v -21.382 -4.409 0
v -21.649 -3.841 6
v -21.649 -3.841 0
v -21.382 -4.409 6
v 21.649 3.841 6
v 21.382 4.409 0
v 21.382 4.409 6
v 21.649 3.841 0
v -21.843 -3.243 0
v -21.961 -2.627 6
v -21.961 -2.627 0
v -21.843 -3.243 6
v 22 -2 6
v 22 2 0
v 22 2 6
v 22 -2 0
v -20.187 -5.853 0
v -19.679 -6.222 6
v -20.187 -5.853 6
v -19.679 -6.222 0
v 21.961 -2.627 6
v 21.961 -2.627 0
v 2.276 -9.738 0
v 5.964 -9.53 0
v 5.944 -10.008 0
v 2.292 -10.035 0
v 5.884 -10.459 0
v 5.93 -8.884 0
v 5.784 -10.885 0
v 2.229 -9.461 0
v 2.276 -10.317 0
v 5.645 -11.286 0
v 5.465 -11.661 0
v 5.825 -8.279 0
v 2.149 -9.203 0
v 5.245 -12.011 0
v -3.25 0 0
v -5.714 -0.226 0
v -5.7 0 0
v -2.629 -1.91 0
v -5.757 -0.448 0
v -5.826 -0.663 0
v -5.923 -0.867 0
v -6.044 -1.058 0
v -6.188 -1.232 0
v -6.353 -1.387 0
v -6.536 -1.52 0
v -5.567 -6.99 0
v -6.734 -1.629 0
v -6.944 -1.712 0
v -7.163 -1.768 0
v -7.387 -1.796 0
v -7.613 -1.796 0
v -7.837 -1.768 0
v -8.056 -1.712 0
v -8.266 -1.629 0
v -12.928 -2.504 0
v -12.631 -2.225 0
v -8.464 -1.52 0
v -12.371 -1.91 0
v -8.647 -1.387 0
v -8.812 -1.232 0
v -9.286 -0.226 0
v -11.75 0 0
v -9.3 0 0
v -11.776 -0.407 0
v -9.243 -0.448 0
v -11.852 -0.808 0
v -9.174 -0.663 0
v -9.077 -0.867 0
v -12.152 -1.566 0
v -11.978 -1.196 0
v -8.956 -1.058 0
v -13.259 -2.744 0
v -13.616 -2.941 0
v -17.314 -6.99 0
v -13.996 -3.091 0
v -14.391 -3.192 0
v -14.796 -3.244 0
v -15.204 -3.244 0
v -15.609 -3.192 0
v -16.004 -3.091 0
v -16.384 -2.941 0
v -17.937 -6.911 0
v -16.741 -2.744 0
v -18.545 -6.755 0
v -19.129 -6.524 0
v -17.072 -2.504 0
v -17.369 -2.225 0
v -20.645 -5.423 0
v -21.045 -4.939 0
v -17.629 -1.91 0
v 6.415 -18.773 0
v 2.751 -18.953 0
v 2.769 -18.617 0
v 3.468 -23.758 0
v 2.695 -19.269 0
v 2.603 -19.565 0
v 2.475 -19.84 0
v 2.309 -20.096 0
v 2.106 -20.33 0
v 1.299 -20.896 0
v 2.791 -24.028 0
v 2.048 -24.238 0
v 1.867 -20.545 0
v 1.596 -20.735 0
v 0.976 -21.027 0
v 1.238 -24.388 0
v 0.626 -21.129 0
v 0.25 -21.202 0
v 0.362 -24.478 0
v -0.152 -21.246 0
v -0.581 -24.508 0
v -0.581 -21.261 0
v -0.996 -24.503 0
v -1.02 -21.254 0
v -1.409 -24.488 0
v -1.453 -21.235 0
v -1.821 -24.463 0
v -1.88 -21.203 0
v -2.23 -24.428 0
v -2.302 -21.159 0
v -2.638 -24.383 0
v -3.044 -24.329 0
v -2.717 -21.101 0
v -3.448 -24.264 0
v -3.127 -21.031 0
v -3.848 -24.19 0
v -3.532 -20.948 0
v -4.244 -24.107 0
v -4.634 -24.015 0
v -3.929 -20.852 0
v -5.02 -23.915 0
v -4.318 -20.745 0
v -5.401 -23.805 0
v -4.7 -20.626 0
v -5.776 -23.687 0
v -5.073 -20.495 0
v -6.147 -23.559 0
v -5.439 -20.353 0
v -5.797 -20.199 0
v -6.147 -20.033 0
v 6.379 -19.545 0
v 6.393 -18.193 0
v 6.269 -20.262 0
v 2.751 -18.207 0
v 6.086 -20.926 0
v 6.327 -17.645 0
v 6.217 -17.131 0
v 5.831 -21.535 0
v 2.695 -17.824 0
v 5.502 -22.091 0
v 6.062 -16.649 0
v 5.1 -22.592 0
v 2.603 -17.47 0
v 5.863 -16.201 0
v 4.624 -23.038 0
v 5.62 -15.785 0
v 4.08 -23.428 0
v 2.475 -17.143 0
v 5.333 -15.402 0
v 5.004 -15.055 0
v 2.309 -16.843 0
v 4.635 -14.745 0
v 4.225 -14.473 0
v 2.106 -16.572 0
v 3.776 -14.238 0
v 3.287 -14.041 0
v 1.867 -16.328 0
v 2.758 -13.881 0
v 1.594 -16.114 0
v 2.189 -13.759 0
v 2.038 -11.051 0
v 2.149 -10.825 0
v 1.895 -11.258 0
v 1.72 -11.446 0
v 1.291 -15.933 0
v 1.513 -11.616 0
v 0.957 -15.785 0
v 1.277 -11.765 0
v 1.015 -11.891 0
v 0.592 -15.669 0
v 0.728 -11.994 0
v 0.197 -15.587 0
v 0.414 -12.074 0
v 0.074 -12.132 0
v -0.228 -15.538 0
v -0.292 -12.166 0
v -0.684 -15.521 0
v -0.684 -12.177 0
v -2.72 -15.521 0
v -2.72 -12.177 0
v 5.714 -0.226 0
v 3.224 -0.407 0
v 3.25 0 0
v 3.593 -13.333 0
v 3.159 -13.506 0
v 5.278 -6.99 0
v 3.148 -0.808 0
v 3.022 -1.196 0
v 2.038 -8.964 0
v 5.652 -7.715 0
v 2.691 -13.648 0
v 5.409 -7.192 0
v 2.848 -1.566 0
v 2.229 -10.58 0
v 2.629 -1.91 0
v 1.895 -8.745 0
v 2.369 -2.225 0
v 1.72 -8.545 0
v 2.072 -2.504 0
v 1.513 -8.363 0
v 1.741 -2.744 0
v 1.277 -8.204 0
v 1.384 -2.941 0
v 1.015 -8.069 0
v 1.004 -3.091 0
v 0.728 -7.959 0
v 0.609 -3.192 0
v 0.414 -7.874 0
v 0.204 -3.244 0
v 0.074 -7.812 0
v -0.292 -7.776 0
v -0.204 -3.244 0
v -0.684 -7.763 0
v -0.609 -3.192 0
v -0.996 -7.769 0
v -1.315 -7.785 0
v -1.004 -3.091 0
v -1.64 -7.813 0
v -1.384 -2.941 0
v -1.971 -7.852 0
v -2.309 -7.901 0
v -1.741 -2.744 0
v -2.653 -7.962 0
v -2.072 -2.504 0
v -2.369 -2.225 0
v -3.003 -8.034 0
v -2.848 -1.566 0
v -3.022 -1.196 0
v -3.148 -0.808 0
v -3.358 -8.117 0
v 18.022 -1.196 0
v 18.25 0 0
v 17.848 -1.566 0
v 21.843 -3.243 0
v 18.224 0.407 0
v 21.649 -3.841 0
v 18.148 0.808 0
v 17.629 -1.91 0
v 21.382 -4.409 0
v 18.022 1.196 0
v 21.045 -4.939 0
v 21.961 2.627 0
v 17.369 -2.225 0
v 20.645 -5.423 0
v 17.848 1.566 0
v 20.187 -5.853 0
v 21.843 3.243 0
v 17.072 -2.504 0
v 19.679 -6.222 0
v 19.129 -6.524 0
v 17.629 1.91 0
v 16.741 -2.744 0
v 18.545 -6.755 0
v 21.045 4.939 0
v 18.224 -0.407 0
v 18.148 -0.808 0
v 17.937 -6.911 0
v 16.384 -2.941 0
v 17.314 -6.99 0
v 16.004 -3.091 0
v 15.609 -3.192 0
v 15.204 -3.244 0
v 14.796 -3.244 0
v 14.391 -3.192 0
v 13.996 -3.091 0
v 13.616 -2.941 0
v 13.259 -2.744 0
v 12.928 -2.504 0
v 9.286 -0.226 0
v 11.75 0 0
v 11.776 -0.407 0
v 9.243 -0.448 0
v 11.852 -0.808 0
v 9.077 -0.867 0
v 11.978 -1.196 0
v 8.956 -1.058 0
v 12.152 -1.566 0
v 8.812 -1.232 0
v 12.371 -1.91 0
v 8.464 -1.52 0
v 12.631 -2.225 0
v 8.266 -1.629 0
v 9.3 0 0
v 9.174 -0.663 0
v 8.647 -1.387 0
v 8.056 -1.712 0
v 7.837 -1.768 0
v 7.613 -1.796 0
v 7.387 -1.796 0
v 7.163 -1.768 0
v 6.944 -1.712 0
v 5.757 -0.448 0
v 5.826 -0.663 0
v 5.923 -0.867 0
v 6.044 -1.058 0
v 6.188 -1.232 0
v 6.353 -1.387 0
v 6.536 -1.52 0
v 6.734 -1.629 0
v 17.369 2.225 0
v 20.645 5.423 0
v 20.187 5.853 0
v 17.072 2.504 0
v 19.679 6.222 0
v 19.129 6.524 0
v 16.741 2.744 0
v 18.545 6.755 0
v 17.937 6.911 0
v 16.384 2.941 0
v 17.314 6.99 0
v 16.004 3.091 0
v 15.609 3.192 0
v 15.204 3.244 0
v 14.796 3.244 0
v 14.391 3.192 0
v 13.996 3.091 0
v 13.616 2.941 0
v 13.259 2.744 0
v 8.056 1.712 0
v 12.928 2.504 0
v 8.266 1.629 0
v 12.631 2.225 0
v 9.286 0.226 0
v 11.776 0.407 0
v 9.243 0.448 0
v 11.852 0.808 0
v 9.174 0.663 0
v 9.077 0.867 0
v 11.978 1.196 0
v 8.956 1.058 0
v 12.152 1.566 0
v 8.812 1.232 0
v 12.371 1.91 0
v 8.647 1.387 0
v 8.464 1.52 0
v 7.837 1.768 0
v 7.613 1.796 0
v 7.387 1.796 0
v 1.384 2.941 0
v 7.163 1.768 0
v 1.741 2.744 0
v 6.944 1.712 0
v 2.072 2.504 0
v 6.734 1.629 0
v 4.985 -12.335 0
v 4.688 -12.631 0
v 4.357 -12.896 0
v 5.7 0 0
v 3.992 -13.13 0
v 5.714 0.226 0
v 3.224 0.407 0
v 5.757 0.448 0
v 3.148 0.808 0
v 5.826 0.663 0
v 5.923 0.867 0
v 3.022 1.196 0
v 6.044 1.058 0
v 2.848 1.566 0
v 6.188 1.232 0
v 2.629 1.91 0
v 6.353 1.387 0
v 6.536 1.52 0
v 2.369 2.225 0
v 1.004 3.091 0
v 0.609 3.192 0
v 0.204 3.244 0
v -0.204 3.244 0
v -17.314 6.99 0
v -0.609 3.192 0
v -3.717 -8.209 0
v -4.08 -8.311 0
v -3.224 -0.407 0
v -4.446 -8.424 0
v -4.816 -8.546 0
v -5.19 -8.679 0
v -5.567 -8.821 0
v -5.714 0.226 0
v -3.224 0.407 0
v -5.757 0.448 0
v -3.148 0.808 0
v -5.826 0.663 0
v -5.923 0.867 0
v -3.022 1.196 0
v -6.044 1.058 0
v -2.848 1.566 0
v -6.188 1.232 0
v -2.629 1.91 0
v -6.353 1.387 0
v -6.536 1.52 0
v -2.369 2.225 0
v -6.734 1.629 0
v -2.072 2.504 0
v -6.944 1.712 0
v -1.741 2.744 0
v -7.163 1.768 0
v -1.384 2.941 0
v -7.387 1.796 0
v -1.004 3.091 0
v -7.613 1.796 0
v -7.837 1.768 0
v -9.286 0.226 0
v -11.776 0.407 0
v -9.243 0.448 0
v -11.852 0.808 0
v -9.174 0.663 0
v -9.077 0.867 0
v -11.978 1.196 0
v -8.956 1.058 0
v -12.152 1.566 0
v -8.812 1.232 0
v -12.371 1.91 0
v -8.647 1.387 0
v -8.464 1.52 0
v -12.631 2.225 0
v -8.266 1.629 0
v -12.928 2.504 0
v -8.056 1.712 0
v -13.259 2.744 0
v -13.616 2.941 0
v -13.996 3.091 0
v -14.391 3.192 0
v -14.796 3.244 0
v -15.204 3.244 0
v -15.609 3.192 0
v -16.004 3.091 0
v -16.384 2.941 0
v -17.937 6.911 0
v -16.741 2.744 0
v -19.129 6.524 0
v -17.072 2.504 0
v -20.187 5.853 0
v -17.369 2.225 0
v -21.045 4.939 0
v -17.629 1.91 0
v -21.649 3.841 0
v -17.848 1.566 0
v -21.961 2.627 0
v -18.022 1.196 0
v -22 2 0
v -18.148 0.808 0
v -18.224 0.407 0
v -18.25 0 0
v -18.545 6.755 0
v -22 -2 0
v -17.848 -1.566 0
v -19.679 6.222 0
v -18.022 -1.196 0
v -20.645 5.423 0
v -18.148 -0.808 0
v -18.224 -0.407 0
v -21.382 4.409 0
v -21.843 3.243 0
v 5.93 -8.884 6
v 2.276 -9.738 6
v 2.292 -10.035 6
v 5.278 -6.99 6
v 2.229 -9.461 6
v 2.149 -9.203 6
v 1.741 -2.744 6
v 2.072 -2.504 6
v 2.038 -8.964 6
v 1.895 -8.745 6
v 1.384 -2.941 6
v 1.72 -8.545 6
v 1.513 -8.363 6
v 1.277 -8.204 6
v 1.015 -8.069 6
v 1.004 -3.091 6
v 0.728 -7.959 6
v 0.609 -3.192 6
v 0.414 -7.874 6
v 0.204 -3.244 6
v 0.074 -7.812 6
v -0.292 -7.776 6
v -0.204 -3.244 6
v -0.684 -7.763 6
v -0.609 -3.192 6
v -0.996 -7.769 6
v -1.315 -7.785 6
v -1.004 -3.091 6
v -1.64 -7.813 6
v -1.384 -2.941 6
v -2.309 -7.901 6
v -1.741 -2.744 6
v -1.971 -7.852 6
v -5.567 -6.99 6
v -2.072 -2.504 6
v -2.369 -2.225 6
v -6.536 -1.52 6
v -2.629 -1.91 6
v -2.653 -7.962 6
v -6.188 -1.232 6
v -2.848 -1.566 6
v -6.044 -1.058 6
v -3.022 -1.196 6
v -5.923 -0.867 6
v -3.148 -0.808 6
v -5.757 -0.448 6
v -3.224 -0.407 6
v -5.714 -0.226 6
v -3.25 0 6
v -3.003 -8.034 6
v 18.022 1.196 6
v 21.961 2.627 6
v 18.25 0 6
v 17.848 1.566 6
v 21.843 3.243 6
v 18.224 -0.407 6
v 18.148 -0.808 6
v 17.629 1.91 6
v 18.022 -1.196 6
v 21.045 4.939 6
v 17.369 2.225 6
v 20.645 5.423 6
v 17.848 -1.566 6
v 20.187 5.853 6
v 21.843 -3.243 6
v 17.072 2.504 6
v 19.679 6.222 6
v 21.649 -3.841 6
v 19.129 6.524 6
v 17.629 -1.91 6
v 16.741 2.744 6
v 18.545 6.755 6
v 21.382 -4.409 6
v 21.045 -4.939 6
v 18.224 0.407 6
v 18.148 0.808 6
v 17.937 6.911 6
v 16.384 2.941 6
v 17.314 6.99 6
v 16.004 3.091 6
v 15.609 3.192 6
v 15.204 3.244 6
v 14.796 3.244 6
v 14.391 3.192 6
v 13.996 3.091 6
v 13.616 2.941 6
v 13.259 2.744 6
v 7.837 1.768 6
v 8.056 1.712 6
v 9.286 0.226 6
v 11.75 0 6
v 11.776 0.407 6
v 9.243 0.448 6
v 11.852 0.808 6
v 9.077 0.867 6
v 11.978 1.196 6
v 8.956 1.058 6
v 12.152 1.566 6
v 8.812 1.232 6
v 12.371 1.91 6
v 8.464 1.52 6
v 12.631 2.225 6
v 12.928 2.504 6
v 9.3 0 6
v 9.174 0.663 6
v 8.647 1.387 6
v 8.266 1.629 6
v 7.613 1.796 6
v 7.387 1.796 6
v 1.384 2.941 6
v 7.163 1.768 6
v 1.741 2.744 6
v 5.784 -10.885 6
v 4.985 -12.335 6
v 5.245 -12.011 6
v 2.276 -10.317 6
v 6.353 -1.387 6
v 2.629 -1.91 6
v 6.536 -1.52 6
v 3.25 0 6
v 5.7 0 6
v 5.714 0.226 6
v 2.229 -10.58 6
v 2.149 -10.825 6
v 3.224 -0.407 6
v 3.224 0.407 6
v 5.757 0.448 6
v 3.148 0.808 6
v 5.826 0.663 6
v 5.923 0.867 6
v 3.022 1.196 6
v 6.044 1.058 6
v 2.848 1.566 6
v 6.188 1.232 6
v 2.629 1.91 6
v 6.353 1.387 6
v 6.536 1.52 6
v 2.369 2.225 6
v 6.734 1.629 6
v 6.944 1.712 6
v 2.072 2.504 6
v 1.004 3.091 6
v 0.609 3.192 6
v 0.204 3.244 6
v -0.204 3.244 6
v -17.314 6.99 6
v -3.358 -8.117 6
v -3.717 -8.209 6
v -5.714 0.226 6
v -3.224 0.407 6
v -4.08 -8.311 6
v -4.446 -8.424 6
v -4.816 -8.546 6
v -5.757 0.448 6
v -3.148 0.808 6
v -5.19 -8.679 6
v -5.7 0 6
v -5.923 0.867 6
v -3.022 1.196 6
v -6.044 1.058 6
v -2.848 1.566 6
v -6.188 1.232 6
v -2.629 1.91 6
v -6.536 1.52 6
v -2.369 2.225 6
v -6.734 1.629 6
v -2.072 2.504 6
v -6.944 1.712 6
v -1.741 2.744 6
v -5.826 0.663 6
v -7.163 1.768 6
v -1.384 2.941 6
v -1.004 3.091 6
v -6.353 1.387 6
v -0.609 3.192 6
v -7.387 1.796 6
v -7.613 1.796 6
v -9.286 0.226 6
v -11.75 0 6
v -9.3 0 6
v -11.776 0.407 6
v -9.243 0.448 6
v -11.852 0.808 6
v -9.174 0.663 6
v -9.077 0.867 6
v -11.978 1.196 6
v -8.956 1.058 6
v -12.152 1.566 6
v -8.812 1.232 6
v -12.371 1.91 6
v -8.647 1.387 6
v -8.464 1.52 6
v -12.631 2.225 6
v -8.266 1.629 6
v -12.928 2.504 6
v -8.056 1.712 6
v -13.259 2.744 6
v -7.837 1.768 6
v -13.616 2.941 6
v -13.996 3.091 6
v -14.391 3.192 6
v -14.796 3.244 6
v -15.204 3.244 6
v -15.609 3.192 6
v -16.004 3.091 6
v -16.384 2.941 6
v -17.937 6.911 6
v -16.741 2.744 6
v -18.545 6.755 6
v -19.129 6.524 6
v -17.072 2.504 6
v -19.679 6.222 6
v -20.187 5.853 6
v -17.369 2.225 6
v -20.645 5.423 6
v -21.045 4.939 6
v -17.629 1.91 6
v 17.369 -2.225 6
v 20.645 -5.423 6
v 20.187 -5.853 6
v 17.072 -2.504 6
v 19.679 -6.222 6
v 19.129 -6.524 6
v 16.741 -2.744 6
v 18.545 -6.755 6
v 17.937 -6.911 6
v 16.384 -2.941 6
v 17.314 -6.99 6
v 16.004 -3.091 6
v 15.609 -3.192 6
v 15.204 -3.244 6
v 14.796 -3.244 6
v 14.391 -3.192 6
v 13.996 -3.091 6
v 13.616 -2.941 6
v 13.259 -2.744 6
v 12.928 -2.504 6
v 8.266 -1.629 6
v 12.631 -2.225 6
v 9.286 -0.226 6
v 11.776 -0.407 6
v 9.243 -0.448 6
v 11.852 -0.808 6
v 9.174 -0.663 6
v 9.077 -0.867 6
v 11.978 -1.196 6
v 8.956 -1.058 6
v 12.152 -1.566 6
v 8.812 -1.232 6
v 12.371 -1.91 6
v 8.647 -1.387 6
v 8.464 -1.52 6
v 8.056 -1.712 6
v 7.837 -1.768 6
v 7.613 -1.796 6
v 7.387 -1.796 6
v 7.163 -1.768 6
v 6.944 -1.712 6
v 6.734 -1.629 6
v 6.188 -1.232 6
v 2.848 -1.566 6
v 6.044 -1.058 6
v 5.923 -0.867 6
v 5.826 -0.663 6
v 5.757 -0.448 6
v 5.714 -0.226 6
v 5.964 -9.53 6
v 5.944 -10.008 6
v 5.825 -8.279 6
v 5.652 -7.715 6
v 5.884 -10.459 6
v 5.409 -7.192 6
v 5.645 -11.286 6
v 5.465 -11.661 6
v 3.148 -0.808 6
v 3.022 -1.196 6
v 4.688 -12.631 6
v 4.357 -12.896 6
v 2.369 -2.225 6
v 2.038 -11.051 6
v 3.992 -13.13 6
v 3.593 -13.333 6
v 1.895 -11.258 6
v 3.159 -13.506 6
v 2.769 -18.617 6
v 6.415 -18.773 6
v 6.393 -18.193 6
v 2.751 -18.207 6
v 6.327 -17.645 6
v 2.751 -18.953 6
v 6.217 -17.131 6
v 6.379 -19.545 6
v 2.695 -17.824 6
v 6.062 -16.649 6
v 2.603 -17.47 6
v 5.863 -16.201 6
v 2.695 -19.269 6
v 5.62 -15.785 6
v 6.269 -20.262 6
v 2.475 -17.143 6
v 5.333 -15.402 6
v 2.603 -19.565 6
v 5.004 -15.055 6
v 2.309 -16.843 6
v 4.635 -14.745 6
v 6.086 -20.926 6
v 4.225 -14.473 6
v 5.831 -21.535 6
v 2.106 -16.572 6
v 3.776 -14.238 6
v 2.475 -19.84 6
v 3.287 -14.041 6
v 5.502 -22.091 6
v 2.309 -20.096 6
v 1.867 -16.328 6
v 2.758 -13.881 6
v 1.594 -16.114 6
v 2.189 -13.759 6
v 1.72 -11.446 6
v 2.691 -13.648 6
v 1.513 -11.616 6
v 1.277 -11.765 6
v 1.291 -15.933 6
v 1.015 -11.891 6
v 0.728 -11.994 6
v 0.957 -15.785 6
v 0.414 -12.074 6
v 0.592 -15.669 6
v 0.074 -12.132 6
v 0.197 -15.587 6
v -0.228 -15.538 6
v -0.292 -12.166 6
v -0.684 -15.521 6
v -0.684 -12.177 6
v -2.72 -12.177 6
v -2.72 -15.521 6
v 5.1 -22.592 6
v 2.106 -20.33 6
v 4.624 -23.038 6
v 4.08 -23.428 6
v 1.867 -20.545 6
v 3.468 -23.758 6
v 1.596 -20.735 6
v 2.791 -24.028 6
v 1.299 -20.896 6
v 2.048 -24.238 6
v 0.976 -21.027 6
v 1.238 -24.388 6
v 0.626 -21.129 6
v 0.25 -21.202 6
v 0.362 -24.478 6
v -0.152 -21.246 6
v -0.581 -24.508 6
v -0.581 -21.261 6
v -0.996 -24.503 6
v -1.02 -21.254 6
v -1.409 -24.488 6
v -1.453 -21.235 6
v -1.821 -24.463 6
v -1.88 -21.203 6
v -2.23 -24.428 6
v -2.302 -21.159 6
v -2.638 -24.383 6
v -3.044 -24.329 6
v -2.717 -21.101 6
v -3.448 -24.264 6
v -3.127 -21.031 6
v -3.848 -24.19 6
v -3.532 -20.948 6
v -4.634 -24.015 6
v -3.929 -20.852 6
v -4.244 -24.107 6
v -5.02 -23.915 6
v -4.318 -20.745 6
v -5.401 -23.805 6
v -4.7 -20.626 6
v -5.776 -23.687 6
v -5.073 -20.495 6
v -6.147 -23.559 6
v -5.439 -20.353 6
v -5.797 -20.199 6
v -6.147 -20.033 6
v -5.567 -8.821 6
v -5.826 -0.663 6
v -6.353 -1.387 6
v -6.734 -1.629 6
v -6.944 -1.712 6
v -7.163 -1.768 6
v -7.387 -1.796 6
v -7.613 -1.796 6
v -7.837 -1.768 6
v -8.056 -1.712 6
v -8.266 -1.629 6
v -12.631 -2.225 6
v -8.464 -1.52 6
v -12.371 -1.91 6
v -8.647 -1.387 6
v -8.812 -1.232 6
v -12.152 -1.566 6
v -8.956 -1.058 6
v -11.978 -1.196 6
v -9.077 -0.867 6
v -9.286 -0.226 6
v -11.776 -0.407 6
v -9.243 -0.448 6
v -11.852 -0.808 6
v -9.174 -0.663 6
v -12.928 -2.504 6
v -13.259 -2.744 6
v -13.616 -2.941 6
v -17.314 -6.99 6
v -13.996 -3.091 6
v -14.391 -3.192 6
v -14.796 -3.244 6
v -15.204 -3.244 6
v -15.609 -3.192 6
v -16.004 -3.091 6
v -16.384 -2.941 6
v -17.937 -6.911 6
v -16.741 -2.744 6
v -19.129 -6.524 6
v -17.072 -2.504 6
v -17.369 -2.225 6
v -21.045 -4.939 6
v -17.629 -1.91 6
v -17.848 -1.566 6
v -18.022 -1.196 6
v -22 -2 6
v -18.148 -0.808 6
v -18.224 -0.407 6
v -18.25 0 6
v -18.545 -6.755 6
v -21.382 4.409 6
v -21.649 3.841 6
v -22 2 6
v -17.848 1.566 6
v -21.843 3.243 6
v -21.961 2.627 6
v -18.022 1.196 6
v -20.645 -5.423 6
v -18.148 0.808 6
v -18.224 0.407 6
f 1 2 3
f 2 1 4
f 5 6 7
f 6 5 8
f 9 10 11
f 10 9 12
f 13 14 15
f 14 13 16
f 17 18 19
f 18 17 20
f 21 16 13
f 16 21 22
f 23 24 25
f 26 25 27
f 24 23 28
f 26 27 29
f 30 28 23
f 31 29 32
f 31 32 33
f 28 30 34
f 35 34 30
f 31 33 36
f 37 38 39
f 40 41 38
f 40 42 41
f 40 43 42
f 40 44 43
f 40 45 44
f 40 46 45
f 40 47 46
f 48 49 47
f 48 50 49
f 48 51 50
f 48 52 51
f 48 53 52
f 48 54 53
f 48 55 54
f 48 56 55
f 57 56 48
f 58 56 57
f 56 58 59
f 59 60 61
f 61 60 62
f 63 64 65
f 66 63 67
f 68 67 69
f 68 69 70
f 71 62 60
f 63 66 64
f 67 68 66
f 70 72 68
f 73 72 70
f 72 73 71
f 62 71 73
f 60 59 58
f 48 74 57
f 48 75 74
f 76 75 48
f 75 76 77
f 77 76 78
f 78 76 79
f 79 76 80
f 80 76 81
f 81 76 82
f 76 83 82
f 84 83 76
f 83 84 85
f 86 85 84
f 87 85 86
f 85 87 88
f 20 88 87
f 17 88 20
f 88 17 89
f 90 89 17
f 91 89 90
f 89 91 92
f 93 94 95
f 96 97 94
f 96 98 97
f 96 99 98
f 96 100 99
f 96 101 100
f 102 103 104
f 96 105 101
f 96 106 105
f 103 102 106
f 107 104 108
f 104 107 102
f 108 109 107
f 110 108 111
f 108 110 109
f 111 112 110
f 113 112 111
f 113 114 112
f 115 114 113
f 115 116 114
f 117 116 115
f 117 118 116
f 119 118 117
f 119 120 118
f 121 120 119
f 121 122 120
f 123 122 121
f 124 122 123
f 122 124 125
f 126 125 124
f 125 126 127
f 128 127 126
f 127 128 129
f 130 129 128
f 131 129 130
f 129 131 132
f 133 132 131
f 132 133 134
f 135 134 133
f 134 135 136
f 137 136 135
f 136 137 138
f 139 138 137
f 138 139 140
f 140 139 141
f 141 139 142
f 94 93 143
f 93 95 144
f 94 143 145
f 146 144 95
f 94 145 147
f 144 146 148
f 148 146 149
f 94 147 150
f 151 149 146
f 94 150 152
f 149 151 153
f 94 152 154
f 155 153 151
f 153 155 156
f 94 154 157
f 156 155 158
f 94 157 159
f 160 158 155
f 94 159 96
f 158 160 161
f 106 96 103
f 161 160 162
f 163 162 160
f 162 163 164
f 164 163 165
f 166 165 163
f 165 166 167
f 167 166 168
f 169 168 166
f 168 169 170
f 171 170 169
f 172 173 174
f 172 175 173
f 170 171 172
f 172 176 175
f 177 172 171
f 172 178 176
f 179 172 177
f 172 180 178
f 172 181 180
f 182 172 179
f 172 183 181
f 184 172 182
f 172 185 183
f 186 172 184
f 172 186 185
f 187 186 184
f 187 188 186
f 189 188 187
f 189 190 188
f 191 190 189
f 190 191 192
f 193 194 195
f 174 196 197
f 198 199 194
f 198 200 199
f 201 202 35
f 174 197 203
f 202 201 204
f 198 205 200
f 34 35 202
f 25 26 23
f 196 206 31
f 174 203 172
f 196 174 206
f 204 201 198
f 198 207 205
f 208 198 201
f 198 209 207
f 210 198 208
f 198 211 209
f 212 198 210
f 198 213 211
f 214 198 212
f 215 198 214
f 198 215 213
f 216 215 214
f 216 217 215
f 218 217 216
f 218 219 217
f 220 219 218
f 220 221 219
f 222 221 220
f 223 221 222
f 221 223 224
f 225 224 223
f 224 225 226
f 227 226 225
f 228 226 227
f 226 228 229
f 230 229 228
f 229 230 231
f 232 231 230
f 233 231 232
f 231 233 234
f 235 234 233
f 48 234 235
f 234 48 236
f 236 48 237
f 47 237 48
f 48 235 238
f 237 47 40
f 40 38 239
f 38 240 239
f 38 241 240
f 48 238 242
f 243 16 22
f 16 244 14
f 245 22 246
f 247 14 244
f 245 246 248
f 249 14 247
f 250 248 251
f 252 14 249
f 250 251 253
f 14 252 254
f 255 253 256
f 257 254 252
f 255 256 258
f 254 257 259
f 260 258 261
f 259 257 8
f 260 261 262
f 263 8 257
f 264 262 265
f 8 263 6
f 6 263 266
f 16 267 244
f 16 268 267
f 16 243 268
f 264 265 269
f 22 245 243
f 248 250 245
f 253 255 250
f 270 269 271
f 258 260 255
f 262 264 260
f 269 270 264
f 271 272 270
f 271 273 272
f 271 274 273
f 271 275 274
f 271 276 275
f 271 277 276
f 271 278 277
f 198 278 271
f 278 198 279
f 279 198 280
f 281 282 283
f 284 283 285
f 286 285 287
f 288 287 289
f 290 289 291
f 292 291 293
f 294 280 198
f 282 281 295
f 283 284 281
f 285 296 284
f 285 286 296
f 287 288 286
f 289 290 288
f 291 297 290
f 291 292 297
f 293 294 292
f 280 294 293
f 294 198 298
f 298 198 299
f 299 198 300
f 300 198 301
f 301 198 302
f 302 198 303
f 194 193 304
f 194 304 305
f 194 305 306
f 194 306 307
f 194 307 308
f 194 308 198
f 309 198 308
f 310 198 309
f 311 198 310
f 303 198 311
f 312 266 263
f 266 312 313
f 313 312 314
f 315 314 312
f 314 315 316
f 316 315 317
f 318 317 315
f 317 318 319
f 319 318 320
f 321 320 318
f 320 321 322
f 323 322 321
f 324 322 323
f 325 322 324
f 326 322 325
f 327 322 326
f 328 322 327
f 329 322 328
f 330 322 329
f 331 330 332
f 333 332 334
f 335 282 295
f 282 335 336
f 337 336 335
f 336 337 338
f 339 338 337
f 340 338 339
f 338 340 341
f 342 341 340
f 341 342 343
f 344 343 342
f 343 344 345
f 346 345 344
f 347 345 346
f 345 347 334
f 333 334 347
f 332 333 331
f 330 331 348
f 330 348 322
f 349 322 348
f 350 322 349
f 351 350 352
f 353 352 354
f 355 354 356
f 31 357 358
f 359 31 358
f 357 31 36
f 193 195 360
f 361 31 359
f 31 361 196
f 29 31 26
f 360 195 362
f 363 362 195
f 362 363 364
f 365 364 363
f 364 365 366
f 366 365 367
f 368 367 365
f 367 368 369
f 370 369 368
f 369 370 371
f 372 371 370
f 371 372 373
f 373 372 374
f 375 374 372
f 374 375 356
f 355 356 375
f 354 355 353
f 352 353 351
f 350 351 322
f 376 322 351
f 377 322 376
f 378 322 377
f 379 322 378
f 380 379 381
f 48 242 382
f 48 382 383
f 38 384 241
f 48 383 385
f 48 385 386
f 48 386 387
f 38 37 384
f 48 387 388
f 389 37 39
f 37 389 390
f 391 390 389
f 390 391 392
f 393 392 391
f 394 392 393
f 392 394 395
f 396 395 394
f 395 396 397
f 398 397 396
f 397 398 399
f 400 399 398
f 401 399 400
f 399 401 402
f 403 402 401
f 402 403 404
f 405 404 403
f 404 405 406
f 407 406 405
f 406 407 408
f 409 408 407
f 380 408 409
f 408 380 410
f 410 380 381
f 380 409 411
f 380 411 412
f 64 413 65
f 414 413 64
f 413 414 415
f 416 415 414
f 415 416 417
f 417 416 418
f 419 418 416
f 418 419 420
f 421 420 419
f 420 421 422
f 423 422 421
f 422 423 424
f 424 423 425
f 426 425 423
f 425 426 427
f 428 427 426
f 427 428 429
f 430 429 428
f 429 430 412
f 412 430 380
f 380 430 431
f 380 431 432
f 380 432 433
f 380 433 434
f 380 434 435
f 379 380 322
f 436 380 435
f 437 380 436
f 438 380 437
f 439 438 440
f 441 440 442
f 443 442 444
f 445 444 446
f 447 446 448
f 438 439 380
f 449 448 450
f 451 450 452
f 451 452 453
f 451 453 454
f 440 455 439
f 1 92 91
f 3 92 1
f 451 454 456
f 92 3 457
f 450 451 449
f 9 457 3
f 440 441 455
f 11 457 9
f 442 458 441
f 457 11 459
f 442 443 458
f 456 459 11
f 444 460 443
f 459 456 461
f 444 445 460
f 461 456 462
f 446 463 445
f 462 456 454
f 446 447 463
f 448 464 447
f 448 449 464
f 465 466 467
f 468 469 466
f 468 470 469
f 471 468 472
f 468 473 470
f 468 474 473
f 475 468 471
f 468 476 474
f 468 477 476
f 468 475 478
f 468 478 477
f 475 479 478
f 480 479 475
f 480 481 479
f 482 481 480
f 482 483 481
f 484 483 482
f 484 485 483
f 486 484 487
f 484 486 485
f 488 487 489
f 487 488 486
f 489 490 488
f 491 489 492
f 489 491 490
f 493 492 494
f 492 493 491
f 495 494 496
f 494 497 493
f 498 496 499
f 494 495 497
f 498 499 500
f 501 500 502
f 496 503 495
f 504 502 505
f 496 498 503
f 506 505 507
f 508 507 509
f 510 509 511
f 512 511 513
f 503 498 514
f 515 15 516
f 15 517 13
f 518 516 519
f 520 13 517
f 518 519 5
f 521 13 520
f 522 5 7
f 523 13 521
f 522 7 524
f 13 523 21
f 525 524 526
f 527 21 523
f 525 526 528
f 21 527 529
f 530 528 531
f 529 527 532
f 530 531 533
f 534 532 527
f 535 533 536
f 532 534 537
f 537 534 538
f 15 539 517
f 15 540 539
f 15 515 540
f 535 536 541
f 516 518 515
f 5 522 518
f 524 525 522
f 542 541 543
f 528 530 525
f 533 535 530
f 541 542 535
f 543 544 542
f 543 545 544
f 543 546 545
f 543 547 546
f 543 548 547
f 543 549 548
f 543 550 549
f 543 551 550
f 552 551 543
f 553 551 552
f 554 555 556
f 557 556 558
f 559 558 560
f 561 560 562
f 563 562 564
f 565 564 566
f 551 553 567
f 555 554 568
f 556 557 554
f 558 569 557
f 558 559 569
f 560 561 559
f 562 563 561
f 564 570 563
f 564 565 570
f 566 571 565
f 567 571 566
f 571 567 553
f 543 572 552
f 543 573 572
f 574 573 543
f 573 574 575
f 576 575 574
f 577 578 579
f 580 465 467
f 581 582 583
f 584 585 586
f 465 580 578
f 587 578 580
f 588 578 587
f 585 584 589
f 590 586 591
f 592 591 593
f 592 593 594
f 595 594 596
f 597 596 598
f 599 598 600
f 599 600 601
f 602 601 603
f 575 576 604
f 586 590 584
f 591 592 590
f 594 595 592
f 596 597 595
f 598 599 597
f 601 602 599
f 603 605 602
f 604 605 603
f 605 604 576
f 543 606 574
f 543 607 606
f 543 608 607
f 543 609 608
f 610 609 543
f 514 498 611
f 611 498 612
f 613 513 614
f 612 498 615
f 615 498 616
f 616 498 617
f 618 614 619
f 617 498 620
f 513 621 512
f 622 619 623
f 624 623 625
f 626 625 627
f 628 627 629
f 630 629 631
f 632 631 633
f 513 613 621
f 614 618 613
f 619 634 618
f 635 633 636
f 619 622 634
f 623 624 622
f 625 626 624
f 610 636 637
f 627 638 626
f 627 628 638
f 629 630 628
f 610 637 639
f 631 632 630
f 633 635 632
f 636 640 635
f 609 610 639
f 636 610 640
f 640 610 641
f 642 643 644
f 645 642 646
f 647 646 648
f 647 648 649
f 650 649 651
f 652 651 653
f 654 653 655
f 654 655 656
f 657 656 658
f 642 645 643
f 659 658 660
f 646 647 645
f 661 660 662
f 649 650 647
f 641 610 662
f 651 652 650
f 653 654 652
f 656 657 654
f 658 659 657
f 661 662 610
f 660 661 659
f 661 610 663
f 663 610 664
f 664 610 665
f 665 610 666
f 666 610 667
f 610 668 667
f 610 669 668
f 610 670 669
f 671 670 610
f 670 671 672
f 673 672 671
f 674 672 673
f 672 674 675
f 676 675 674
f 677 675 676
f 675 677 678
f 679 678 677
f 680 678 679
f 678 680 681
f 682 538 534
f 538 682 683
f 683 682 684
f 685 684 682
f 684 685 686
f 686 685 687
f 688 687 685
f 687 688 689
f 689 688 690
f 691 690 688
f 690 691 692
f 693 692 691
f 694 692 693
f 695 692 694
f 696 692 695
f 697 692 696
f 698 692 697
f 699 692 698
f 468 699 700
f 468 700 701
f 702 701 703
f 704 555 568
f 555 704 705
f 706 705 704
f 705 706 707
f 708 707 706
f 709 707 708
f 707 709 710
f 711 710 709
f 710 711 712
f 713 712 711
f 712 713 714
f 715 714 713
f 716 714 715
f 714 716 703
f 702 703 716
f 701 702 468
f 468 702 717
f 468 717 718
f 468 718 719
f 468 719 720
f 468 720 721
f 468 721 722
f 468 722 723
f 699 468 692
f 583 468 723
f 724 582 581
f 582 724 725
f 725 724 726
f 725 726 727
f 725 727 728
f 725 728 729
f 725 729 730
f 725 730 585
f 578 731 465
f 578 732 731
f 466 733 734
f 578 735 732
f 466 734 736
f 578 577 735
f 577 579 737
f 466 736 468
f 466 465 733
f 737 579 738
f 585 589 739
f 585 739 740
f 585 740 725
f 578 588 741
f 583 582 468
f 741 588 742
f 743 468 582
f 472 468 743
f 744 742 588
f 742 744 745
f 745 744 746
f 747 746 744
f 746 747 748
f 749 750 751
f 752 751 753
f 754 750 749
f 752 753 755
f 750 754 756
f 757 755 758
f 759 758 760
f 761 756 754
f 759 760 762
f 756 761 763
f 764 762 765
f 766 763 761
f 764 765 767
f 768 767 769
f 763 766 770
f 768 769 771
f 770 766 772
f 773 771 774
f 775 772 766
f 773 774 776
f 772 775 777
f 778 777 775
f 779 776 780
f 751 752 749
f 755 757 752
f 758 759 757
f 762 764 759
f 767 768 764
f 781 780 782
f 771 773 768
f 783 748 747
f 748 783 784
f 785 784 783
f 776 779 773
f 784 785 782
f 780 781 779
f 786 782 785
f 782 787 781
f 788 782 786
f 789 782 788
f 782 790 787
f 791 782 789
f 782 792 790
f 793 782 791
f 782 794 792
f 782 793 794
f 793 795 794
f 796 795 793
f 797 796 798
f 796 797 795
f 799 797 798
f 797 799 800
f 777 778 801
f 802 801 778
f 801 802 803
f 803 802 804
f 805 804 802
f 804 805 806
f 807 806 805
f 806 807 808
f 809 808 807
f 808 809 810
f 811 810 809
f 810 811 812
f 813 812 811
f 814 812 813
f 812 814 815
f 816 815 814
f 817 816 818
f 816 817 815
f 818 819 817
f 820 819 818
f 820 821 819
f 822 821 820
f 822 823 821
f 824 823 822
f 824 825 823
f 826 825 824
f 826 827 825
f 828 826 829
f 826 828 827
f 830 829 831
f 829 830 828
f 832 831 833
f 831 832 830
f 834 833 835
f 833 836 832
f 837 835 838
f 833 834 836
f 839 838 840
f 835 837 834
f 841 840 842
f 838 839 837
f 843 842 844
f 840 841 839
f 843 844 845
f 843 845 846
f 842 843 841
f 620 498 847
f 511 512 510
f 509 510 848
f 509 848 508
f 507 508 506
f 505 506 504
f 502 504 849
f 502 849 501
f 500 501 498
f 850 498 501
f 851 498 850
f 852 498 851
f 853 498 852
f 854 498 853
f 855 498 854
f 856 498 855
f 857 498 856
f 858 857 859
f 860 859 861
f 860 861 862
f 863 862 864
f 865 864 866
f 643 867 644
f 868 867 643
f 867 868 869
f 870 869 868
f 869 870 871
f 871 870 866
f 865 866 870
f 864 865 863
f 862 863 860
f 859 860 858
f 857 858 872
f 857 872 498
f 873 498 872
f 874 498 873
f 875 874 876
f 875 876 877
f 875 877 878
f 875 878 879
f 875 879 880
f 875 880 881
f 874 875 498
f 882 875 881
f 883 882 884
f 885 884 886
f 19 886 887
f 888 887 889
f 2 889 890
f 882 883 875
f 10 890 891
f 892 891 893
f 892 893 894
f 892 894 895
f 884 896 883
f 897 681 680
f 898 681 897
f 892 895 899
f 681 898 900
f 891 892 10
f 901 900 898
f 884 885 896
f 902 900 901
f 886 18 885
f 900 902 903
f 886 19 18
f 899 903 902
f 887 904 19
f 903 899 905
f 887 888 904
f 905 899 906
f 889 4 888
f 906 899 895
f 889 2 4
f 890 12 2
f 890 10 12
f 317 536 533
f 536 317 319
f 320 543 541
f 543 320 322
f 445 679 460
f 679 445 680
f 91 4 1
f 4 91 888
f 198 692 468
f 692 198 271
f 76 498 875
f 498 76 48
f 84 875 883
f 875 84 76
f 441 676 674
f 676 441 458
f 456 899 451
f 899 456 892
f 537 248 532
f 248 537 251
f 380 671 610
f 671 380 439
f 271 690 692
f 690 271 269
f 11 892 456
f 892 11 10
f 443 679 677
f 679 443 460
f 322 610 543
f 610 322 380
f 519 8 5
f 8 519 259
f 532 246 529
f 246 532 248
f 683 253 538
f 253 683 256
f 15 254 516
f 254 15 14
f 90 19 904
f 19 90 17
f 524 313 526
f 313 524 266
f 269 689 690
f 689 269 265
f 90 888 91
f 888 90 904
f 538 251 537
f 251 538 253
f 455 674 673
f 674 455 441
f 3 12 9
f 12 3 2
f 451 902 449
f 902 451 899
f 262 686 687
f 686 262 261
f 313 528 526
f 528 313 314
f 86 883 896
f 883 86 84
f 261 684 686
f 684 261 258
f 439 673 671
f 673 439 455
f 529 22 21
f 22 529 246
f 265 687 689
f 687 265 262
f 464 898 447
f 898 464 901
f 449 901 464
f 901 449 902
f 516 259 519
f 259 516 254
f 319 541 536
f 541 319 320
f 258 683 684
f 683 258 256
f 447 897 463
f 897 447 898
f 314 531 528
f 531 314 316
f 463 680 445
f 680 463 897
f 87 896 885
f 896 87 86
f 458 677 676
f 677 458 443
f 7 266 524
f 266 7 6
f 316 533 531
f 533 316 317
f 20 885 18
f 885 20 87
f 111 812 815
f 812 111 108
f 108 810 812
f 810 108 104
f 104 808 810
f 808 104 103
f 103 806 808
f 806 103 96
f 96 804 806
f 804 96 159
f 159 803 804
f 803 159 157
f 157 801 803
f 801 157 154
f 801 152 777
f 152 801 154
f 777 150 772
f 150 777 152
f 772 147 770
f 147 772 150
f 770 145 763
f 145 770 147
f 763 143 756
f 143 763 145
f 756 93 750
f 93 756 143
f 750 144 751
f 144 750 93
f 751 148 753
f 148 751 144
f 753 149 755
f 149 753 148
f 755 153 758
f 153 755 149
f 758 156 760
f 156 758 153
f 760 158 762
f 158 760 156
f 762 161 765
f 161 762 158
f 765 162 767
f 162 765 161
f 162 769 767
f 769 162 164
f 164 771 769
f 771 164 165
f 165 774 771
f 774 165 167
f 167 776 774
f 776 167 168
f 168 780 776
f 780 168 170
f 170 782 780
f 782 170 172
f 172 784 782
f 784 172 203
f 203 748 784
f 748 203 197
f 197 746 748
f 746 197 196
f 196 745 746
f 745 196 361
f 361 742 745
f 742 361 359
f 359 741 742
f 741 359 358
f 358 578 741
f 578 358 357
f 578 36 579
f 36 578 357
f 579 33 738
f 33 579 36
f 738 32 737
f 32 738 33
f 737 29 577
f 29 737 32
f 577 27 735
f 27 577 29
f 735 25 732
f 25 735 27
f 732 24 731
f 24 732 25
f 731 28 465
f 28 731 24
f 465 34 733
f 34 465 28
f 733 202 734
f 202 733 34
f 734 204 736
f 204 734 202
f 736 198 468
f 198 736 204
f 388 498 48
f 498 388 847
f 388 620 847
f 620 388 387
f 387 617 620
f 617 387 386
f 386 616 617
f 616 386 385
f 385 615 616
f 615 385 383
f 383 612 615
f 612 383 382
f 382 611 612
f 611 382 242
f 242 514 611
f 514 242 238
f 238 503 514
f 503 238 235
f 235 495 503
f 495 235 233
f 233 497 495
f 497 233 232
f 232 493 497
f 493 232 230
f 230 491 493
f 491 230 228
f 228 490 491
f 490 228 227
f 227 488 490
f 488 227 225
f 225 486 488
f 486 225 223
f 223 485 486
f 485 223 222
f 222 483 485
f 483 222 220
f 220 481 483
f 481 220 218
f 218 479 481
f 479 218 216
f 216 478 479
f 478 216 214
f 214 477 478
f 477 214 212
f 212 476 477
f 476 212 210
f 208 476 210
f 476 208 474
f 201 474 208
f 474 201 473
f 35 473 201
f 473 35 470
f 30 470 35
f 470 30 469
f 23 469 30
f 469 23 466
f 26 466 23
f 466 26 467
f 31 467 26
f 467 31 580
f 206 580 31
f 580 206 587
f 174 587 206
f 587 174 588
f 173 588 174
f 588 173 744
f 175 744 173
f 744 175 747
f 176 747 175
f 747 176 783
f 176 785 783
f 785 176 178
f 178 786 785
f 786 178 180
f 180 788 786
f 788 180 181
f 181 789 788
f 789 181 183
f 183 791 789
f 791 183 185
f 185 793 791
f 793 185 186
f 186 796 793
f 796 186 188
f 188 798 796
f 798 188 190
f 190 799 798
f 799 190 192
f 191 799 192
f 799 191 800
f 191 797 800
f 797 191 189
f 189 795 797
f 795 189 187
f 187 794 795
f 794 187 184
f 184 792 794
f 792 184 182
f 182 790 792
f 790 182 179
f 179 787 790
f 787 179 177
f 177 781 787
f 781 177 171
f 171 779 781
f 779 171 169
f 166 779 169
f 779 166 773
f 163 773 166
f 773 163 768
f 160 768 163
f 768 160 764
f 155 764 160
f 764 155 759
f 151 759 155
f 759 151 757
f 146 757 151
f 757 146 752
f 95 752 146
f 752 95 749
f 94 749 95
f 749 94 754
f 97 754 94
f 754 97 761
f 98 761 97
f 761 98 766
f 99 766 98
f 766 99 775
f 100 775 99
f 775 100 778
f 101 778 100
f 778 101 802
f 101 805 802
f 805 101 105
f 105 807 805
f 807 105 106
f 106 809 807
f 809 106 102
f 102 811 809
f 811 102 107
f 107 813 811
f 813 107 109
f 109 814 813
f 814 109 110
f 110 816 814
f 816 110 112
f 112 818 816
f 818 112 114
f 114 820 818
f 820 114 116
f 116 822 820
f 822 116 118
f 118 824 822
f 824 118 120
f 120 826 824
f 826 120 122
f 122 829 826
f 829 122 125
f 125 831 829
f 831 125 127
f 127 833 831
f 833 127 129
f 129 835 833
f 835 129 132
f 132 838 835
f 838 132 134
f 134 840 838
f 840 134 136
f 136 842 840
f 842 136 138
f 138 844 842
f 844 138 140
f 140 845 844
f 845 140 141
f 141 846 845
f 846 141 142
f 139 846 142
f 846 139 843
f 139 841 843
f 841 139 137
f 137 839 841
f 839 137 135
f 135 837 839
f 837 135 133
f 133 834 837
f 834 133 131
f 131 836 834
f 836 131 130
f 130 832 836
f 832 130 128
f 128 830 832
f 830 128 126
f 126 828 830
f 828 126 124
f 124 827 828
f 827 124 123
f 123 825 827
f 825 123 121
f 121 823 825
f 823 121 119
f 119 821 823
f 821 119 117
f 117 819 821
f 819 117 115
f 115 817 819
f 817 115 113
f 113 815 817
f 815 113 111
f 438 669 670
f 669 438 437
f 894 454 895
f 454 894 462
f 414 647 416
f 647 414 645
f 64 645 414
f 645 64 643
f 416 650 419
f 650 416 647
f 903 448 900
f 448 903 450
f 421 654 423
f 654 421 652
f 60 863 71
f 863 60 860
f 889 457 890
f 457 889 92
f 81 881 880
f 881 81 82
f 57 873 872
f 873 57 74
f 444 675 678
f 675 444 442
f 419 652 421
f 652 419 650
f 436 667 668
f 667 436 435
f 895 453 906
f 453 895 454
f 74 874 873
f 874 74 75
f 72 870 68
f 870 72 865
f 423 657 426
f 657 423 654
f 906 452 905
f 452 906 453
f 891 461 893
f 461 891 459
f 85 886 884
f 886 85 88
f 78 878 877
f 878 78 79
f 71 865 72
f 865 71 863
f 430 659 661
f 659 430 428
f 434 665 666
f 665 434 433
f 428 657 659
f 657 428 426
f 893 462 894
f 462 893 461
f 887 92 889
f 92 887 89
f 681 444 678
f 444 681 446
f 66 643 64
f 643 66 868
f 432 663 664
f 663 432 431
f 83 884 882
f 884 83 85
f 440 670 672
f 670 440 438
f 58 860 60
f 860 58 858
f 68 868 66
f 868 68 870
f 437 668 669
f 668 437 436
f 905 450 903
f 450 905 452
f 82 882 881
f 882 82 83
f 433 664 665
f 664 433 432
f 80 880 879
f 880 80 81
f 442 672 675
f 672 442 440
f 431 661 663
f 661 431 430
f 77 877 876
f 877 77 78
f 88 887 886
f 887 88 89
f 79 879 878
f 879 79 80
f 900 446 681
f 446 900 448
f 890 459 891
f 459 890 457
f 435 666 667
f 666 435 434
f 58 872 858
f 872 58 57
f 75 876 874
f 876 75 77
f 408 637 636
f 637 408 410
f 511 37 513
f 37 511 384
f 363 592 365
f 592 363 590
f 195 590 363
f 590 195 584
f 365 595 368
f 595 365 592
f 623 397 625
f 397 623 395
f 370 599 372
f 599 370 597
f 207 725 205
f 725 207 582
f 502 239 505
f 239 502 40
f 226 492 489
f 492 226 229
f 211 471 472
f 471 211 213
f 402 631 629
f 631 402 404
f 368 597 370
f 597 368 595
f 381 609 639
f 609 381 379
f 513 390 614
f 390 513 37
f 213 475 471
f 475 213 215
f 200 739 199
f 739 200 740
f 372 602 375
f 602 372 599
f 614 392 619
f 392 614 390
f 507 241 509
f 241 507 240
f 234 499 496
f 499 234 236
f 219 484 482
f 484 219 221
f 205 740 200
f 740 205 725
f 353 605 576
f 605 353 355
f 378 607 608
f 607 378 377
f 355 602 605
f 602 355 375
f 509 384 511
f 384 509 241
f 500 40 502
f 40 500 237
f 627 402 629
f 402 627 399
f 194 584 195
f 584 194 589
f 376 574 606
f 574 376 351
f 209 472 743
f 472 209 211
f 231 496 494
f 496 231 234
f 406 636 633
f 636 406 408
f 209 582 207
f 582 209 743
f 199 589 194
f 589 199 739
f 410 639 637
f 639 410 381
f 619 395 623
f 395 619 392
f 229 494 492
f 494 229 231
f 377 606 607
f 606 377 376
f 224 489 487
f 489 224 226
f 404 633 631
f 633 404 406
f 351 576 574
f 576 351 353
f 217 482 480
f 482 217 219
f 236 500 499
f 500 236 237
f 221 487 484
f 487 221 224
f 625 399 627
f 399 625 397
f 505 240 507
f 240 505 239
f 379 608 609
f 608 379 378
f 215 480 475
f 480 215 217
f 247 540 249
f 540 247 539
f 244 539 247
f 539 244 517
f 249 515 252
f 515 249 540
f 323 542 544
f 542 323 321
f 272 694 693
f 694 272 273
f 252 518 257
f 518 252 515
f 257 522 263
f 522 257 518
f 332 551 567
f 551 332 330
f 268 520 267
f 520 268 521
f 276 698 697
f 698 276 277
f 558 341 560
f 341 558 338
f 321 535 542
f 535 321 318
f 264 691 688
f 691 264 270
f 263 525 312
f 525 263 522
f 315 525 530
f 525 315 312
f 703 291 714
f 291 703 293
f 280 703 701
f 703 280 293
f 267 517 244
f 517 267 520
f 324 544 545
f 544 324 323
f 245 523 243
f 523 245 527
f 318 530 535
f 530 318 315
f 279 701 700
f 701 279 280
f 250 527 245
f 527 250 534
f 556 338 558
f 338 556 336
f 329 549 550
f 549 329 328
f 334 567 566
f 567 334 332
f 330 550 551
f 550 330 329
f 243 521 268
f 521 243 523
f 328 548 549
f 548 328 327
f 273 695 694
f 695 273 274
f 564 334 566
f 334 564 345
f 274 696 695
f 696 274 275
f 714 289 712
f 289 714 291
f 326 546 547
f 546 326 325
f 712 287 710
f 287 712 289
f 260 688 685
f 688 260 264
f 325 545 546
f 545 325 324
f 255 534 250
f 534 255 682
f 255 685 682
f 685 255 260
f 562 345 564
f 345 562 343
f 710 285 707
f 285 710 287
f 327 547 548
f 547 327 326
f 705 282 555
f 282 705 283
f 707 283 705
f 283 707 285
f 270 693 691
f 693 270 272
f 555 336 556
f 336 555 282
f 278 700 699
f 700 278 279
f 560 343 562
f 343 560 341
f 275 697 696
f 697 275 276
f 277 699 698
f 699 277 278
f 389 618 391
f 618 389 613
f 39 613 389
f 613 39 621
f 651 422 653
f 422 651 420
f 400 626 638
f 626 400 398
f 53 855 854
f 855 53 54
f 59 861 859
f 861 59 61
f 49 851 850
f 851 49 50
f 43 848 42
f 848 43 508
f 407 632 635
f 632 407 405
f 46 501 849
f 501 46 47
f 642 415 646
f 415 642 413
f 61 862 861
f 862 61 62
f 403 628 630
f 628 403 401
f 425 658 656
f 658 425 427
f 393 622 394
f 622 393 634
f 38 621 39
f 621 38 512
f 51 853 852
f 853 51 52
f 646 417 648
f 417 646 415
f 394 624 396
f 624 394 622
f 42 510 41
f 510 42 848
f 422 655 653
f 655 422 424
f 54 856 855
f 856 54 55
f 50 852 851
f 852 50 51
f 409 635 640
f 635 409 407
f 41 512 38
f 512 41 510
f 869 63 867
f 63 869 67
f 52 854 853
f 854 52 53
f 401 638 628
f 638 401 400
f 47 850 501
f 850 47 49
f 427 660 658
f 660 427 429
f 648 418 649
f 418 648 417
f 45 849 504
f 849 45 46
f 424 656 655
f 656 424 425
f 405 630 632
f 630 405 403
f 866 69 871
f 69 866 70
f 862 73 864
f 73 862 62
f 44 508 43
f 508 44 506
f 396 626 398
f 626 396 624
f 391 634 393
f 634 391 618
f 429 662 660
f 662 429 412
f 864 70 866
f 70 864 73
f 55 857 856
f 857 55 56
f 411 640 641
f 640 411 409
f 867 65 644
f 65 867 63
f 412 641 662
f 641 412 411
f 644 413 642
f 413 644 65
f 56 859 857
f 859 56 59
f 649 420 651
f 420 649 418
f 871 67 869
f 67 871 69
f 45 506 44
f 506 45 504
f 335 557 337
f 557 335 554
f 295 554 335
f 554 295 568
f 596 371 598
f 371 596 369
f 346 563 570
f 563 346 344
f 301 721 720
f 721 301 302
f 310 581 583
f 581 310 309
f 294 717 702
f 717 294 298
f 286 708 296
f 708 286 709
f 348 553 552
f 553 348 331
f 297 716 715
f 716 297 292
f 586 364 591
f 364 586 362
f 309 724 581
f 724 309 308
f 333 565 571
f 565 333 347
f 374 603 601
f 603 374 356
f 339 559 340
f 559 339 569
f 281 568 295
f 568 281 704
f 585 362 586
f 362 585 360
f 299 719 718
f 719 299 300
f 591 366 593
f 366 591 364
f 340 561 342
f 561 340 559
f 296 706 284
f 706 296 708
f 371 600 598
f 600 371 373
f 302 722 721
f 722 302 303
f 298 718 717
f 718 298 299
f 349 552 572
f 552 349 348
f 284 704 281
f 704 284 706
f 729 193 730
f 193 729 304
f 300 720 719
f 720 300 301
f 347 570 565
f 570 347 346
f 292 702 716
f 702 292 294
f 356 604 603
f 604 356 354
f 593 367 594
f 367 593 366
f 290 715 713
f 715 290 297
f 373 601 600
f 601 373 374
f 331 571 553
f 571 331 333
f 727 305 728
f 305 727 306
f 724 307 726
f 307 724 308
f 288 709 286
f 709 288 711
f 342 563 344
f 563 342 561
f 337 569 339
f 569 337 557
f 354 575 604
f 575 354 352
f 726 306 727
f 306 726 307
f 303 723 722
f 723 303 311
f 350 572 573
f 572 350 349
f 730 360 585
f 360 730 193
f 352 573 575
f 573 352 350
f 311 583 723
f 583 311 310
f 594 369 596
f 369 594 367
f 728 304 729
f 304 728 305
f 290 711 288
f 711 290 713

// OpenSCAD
$fn = 50;


difference() {
	union() {
		hull() {
			translate(v = [-17.0000000000, 2.0000000000, 0]) {
				cylinder(h = 6, r = 5);
			}
			translate(v = [17.0000000000, 2.0000000000, 0]) {
				cylinder(h = 6, r = 5);
			}
			translate(v = [-17.0000000000, -2.0000000000, 0]) {
				cylinder(h = 6, r = 5);
			}
			translate(v = [17.0000000000, -2.0000000000, 0]) {
				cylinder(h = 6, r = 5);
			}
		}
		translate(v = [0, -5, 0]) {
			linear_extrude(height = 6) {
				text(font = "DejaVu Sans Mono:style=Bold", halign = "center", size = 19.0000000000, text = "3", valign = "top");
			}
		}
	}
	union() {
		translate(v = [-15.0000000000, 0.0000000000, 0]) {
			translate(v = [0, 0, -100]) {
				cylinder(h = 200, r = 3.2500000000);
			}
		}
		translate(v = [0, 0, -100]) {
			cylinder(h = 200, r = 3.2500000000);
		}
		translate(v = [15.0000000000, 0.0000000000, 0]) {
			translate(v = [0, 0, -100]) {
				cylinder(h = 200, r = 3.2500000000);
			}
		}
		translate(v = [-15.0000000000, 0.0000000000, 0]) {
			translate(v = [0, 0, -100]) {
				cylinder(h = 200, r = 1.8000000000);
			}
		}
		translate(v = [-7.5000000000, 0.0000000000, 0]) {
			translate(v = [0, 0, -100]) {
				cylinder(h = 200, r = 1.8000000000);
			}
		}
		translate(v = [0, 0, -100]) {
			cylinder(h = 200, r = 1.8000000000);
		}
		translate(v = [7.5000000000, 0.0000000000, 0]) {
			translate(v = [0, 0, -100]) {
				cylinder(h = 200, r = 1.8000000000);
			}
		}
		translate(v = [15.0000000000, 0.0000000000, 0]) {
			translate(v = [0, 0, -100]) {
				cylinder(h = 200, r = 1.8000000000);
			}
		}
	}
}
